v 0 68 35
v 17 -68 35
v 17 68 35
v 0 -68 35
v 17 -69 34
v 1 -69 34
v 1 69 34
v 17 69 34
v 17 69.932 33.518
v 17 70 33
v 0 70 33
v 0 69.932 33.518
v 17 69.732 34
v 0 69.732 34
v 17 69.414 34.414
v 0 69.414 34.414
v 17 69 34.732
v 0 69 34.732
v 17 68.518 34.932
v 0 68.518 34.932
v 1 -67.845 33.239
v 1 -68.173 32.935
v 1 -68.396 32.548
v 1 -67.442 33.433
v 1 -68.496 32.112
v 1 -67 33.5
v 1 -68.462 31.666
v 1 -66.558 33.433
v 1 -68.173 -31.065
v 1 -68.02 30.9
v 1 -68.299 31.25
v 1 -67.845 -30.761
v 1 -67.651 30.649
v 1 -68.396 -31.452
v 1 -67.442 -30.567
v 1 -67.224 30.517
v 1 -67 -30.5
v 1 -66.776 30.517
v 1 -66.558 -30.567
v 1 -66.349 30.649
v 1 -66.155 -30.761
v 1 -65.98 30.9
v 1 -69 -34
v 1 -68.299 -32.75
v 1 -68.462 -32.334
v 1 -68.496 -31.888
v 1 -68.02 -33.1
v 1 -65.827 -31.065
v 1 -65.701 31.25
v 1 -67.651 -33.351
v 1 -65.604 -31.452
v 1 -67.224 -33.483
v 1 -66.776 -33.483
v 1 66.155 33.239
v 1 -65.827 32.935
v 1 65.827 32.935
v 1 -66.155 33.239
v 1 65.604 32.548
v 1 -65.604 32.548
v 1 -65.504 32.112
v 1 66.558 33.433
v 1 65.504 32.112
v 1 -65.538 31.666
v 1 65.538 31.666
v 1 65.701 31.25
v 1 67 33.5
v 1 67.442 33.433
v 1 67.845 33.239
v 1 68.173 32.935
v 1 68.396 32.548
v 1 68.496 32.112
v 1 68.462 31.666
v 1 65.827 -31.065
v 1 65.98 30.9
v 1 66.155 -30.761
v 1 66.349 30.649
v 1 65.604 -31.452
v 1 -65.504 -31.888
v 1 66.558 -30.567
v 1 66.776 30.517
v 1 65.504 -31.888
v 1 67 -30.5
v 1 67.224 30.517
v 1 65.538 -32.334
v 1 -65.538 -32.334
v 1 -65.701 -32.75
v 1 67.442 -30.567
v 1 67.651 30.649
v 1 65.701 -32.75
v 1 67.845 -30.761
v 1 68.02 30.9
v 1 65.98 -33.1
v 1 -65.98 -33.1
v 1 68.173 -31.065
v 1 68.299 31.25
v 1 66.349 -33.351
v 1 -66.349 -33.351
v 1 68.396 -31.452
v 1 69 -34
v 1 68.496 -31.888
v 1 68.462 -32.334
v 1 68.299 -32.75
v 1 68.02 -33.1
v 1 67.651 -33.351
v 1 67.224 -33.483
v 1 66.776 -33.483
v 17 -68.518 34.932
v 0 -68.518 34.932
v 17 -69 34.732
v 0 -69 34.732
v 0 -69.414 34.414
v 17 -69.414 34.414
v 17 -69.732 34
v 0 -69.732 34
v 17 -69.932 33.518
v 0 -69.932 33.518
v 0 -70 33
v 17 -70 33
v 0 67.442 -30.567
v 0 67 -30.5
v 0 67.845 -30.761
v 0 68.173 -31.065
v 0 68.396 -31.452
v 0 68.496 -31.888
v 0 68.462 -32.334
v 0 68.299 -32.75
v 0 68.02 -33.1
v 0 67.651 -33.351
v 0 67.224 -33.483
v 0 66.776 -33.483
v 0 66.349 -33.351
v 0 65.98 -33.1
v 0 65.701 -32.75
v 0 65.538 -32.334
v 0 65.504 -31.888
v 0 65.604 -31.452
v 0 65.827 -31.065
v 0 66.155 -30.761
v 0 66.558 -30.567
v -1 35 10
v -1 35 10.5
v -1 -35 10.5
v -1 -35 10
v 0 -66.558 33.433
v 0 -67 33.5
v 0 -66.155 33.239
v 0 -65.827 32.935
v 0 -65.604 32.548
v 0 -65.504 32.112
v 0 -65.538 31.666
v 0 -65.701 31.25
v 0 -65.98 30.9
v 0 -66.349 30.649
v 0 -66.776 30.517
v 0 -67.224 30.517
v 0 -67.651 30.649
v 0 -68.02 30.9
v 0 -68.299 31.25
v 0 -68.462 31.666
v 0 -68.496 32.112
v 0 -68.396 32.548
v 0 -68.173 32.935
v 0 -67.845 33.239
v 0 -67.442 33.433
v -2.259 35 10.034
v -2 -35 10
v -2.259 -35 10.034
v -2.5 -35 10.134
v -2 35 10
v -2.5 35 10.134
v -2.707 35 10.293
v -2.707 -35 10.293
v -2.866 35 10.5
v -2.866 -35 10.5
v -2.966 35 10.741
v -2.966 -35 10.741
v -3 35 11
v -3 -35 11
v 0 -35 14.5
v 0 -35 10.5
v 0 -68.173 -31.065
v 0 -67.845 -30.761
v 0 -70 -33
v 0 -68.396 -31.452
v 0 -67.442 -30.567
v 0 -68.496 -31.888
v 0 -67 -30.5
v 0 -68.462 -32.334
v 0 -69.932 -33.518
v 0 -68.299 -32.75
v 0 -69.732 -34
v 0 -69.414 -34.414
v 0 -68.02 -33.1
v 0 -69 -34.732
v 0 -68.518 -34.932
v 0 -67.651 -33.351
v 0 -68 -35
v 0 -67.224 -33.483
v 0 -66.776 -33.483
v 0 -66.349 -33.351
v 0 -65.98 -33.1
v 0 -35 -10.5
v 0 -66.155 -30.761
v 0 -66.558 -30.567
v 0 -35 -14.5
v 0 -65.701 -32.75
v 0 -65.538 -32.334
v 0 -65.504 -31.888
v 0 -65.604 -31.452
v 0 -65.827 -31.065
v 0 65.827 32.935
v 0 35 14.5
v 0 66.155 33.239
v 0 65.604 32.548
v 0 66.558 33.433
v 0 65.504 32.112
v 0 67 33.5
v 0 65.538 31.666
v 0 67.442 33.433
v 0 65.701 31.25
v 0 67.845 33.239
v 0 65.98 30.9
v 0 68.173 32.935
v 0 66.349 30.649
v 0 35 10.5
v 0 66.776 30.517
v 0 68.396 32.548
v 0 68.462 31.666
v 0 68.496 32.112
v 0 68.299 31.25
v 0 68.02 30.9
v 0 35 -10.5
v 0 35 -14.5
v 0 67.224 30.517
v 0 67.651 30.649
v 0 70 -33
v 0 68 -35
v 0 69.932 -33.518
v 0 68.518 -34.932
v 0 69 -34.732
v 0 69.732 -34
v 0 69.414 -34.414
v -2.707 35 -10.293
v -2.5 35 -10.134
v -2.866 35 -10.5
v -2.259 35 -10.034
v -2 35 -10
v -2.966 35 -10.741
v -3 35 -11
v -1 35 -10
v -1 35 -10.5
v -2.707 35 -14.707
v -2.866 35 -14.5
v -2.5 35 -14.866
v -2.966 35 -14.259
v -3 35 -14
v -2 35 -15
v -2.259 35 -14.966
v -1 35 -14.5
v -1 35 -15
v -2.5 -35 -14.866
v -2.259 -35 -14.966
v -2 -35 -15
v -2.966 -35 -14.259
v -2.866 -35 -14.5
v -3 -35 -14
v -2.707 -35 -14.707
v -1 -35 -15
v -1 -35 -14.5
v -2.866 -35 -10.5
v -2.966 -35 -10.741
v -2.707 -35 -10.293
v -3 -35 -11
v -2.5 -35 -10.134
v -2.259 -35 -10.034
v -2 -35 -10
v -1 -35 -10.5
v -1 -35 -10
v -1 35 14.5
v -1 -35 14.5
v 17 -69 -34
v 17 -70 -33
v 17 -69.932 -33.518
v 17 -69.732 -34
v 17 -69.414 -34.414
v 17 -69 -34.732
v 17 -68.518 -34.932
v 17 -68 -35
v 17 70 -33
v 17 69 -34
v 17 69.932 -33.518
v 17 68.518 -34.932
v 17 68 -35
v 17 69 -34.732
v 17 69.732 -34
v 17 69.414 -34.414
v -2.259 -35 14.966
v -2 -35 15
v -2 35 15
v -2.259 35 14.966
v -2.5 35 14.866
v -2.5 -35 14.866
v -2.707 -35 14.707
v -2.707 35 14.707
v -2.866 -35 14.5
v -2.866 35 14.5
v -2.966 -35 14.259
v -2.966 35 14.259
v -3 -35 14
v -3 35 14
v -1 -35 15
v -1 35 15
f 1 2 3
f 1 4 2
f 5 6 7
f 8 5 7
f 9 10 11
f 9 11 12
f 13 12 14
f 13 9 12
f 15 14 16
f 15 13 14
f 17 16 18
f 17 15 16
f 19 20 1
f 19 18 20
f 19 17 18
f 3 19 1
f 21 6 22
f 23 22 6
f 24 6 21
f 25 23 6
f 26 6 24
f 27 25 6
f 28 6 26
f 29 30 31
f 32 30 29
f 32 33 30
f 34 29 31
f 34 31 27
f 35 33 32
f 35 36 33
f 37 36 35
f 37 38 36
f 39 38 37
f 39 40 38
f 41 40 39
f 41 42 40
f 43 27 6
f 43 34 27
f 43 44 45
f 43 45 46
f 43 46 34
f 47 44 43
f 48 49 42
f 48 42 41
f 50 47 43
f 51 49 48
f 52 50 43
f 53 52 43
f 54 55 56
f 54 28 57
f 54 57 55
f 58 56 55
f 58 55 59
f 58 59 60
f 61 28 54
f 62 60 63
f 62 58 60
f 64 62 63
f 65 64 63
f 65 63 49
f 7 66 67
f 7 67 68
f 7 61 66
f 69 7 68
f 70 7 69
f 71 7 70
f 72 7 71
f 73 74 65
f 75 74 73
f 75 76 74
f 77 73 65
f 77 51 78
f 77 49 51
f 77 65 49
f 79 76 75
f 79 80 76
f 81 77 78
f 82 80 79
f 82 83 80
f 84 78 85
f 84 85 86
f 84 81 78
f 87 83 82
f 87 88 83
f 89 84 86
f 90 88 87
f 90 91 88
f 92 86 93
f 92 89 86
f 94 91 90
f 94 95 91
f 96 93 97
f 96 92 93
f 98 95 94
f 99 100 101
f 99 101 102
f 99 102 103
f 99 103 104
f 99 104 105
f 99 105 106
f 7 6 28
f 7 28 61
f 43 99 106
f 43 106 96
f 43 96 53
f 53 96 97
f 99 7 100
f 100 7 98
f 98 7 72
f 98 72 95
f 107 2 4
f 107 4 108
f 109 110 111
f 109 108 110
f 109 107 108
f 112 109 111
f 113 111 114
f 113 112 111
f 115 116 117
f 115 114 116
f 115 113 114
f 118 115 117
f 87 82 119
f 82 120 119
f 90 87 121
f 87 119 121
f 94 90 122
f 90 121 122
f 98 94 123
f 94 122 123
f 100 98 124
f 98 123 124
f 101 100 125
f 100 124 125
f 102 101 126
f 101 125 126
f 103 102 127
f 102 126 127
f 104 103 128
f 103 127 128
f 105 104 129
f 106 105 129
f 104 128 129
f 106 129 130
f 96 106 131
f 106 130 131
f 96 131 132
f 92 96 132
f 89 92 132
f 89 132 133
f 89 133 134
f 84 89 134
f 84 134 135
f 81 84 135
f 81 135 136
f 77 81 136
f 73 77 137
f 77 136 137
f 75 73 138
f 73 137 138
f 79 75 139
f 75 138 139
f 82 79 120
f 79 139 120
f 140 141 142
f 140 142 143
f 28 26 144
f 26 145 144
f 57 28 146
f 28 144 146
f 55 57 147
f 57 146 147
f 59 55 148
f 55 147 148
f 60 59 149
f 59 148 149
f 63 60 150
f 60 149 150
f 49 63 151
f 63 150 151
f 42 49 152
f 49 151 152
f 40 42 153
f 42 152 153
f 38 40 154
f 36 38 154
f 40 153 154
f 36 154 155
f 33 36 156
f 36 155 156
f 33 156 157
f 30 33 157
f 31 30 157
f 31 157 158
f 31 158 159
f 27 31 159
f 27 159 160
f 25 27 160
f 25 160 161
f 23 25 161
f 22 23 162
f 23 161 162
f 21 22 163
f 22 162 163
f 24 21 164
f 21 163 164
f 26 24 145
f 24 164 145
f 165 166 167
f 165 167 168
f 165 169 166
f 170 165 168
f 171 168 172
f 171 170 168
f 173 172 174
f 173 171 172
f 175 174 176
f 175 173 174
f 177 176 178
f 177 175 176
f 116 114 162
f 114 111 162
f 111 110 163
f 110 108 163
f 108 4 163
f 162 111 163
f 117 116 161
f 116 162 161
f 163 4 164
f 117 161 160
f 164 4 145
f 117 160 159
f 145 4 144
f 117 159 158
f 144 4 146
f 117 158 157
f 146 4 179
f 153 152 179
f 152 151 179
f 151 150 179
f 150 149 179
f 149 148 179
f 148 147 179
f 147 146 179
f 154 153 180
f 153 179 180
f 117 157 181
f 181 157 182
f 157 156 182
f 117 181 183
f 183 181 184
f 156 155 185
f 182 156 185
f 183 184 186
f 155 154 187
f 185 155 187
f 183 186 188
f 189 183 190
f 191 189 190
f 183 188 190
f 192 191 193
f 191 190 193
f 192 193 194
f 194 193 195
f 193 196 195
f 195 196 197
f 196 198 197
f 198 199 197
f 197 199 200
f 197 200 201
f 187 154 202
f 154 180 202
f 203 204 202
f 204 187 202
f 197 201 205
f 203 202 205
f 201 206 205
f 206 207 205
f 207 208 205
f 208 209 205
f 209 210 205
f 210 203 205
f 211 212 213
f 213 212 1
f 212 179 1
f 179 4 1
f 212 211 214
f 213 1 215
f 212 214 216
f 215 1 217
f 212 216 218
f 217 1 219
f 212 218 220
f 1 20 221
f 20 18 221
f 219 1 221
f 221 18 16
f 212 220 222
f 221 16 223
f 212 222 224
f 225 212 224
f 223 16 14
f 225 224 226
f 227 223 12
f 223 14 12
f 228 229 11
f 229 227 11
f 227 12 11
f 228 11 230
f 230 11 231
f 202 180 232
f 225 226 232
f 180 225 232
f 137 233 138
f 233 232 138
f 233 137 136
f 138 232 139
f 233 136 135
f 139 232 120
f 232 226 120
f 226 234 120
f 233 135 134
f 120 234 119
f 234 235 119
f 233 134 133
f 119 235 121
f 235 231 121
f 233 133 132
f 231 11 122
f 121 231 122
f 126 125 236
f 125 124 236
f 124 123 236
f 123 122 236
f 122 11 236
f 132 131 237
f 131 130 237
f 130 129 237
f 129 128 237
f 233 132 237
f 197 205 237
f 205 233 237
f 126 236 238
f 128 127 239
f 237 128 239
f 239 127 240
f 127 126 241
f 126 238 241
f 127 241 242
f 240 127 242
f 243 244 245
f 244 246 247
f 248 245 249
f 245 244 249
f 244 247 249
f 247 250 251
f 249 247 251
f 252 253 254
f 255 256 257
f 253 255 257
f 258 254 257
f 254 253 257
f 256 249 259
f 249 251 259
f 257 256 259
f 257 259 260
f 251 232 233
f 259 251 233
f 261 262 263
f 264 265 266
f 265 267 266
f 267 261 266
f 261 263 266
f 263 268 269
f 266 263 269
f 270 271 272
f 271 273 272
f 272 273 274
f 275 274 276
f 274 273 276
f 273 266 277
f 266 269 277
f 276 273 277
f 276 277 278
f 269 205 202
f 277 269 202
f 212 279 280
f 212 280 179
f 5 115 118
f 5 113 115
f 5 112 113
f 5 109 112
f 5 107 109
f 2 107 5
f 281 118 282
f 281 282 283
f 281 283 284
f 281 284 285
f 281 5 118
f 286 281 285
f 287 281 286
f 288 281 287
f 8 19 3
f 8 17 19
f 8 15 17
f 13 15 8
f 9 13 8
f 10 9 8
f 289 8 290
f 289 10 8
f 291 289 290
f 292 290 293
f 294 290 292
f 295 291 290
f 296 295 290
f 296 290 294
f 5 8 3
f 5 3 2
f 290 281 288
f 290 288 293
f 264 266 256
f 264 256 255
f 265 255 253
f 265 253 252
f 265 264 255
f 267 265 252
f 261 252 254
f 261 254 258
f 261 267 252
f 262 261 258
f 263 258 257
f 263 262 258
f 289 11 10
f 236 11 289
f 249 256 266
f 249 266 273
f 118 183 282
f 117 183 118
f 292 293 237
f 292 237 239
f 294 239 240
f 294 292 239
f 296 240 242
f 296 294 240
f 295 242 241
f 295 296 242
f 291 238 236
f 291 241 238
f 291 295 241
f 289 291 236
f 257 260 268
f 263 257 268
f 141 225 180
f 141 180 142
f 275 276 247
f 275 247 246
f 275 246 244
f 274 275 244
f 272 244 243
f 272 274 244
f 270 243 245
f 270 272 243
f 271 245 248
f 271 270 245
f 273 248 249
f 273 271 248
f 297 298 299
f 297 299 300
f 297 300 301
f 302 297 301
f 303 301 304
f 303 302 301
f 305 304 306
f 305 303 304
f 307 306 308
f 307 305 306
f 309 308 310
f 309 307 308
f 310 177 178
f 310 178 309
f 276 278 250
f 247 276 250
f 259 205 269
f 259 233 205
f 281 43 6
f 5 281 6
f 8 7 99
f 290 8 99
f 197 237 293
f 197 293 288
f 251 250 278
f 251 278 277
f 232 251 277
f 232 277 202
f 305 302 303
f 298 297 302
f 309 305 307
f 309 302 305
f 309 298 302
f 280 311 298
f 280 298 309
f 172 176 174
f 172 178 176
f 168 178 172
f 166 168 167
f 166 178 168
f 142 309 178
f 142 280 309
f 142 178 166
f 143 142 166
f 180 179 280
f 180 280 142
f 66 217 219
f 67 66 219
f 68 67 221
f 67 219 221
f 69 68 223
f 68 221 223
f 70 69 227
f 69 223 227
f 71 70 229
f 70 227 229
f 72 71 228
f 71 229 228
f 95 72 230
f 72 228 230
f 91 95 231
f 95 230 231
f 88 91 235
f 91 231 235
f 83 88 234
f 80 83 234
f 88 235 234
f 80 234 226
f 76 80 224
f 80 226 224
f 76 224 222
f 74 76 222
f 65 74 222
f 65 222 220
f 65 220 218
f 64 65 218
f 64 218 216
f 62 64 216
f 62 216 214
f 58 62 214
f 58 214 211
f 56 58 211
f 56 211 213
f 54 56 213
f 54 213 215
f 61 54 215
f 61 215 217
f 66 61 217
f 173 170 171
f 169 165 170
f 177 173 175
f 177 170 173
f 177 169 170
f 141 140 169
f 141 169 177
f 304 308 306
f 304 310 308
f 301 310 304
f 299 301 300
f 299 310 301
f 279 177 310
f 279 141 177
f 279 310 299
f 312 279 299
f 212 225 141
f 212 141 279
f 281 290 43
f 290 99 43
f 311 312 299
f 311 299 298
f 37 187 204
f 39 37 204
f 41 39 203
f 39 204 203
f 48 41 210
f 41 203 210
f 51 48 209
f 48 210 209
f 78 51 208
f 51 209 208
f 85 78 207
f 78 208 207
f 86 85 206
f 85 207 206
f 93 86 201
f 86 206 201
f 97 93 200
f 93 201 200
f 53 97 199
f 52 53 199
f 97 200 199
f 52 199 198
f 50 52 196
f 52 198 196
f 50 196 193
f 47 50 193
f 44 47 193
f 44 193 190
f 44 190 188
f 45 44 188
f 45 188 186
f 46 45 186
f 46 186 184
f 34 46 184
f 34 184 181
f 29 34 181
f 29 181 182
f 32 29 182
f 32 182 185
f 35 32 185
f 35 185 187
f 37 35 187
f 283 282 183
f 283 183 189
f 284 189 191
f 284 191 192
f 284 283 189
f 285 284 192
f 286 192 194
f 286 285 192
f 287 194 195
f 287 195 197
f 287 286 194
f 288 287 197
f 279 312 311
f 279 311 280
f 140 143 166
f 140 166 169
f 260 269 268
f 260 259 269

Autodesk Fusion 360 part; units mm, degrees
sketch "Sketch1" plane through (0, 0, 0) normal (1, 0, 0) x (0, 0, -1)
  line L0 (35, -70) -> (-35, -70)
  line L1 (-35, -70) -> (-35, 70)
  line L2 (-35, 70) -> (35, 70)
  line L3 (35, 70) -> (35, -70)
  line L4 (35, -70) -> (-35, 70) construction
  line L5 (-35, -70) -> (35, 70) construction
  dimension "d1" = 70
  dimension "d2" = 140
extrude "Extrude1" add sketch "Sketch1" along normal blind 17
shell "Shell1" thickness 1 removed faces 1 at (17, -23.3333, 11.6667)
fillet "Fillet1" radius 2 1 edges at (8.5, 70, 35)
fillet "Fillet1" radius 2 1 edges at (8.5, 70, -35)
fillet "Fillet1" radius 2 1 edges at (8.5, -70, 35)
fillet "Fillet1" radius 2 1 edges at (8.5, -70, -35)
sketch "Sketch2" plane through (0, 0, 0) normal (-1, 0, 0) x (0, 0, 1)
  arc A0 (-35, -68) -> (-33, -70) centre (-33, -68) ccw
  line L0 (-33, -70) -> (33, -70)
  arc A1 (33, -70) -> (35, -68) centre (33, -68) ccw
  line L1 (35, -68) -> (35, 68)
  arc A2 (35, 68) -> (33, 70) centre (33, 68) ccw
  line L2 (33, 70) -> (-33, 70)
  arc A3 (-33, 70) -> (-35, 68) centre (-33, 68) ccw
  line L3 (-35, 68) -> (-35, -68)
  line L4 (32, 67) -> (-32, 67)
  line L5 (-32, 67) -> (-32, -67)
  line L6 (-32, -67) -> (32, -67)
  line L7 (32, -67) -> (32, 67)
  line L8 (32, 67) -> (-32, -67) construction
  line L9 (-32, 67) -> (32, -67) construction
  circle A4 centre (-32, 67) radius 1.5
  circle A5 centre (32, 67) radius 1.5
  circle A6 centre (32, -67) radius 1.5
  circle A7 centre (-32, -67) radius 1.5
  dimension "d14" = 64
  dimension "d15" = 134
  dimension "d16" = 3
  dimension "d17" = 3
  dimension "d18" = 3
  dimension "d19" = 3
extrude "Extrude2" cut sketch "Sketch2" against normal blind 10 contours L4 L5 A4 | L4 L5 A4 | L4 L7 A5 | L4 L7 A5 | L5 L6 A7 | L5 L6 A7 | L6 L7 A6 | L6 L7 A6
sketch "Sketch3" plane through (0, 0, 0) normal (-1, 0, 0) x (0, 0, 1)
  circle A0 centre (32, -67) radius 1.5
  circle A1 centre (32, 67) radius 1.5
  circle A2 centre (-32, -67) radius 1.5
  circle A3 centre (-32, 67) radius 1.5
  arc A4 (-35, -68) -> (-33, -70) centre (-33, -68) ccw
  line L0 (-33, -70) -> (33, -70)
  arc A5 (33, -70) -> (35, -68) centre (33, -68) ccw
  line L1 (35, -68) -> (35, 68)
  arc A6 (35, 68) -> (33, 70) centre (33, 68) ccw
  line L2 (33, 70) -> (-33, 70)
  arc A7 (-33, 70) -> (-35, 68) centre (-33, 68) ccw
  line L3 (-35, 68) -> (-35, -68)
  line L4 (0, 0) -> (10, 0)
  line L5 (10, 0) -> (-10, 0)
  line L6 (-10, 0) -> (-10, 35)
  line L7 (-10, 35) -> (-15, 35)
  line L8 (-15, 35) -> (-15, -35)
  line L9 (-15, -35) -> (-10, -35)
  line L10 (-10, -35) -> (-10, 0)
  line L11 (10, 0) -> (10, 35)
  line L12 (10, 35) -> (15, 35)
  line L13 (15, 35) -> (15, -35)
  line L14 (15, -35) -> (10, -35)
  line L15 (10, -35) -> (10, 0)
extrude "Extrude3" add sketch "Sketch3" along normal blind 3 contours L11 L12 L13 L14 L15 | L6 L7 L8 L9 L10
fillet "Fillet2" radius 1 1 edges at (-3, 0, 10)
fillet "Fillet2" radius 1 1 edges at (-3, 0, 15)
fillet "Fillet3" radius 1 1 edges at (-3, 0, -10)
fillet "Fillet4" radius 1 1 edges at (-3, 0, -15)
sketch "Sketch4" plane through (0, 35, 0) normal (0, 1, 0) x (-1, 0, 0)
  arc A0 (3, -11) -> (2, -10) centre (2, -11) ccw
  line L0 (2, -10) -> (0, -10)
  line L1 (0, -10) -> (0, -15)
  line L2 (0, -15) -> (2, -15)
  line L3 (0, -10) -> (2, -10)
  line L4 (2, -15) -> (0, -15)
  arc A1 (3, -11) -> (2, -10) centre (2, -11) ccw
  line L5 (0, -10) -> (0.5, -10)
  line L6 (0, -10) -> (0, -10.5)
  line L7 (1, -10.5) -> (0, -10.5)
  line L8 (0, -15) -> (0, -14.5)
  line L9 (0, -14.5) -> (1, -14.5)
  line L10 (0, -15) -> (0, -14.5)
  line L11 (0, -10.5) -> (0, -10)
  line L12 (1, -10) -> (1, -10.5)
  line L13 (1, -14.5) -> (1, -15)
  dimension "d32" = 1
extrude "Extrude4" cut sketch "Sketch4" against normal blind 70
sketch "Sketch5" plane through (0, 35, 0) normal (0, 1, 0) x (-1, 0, 0)
  arc A0 (3, 14) -> (2, 15) centre (2, 14) ccw
  line L0 (2, 15) -> (0, 15)
  line L1 (0, 15) -> (0, 10)
  line L2 (0, 10) -> (2, 10)
  arc A1 (2, 10) -> (3, 11) centre (2, 11) ccw
  line L3 (3, 11) -> (3, 14)
  line L4 (0, 15) -> (1, 15)
  line L5 (1, 15) -> (1, 14.5)
  line L6 (1, 14.5) -> (0, 14.5)
  line L7 (0, 15) -> (0, 14.5)
  line L8 (0, 10) -> (0, 10.5)
  line L9 (1, 10.5) -> (1, 10)
  line L10 (0, 10.5) -> (1, 10.5)
  line L11 (1, 10) -> (0, 10)
extrude "Extrude5" cut sketch "Sketch5" against normal blind 70 contours L0 L1 L4 L5 L6 L7 | L1 L2 L8 L9 L10 L11
